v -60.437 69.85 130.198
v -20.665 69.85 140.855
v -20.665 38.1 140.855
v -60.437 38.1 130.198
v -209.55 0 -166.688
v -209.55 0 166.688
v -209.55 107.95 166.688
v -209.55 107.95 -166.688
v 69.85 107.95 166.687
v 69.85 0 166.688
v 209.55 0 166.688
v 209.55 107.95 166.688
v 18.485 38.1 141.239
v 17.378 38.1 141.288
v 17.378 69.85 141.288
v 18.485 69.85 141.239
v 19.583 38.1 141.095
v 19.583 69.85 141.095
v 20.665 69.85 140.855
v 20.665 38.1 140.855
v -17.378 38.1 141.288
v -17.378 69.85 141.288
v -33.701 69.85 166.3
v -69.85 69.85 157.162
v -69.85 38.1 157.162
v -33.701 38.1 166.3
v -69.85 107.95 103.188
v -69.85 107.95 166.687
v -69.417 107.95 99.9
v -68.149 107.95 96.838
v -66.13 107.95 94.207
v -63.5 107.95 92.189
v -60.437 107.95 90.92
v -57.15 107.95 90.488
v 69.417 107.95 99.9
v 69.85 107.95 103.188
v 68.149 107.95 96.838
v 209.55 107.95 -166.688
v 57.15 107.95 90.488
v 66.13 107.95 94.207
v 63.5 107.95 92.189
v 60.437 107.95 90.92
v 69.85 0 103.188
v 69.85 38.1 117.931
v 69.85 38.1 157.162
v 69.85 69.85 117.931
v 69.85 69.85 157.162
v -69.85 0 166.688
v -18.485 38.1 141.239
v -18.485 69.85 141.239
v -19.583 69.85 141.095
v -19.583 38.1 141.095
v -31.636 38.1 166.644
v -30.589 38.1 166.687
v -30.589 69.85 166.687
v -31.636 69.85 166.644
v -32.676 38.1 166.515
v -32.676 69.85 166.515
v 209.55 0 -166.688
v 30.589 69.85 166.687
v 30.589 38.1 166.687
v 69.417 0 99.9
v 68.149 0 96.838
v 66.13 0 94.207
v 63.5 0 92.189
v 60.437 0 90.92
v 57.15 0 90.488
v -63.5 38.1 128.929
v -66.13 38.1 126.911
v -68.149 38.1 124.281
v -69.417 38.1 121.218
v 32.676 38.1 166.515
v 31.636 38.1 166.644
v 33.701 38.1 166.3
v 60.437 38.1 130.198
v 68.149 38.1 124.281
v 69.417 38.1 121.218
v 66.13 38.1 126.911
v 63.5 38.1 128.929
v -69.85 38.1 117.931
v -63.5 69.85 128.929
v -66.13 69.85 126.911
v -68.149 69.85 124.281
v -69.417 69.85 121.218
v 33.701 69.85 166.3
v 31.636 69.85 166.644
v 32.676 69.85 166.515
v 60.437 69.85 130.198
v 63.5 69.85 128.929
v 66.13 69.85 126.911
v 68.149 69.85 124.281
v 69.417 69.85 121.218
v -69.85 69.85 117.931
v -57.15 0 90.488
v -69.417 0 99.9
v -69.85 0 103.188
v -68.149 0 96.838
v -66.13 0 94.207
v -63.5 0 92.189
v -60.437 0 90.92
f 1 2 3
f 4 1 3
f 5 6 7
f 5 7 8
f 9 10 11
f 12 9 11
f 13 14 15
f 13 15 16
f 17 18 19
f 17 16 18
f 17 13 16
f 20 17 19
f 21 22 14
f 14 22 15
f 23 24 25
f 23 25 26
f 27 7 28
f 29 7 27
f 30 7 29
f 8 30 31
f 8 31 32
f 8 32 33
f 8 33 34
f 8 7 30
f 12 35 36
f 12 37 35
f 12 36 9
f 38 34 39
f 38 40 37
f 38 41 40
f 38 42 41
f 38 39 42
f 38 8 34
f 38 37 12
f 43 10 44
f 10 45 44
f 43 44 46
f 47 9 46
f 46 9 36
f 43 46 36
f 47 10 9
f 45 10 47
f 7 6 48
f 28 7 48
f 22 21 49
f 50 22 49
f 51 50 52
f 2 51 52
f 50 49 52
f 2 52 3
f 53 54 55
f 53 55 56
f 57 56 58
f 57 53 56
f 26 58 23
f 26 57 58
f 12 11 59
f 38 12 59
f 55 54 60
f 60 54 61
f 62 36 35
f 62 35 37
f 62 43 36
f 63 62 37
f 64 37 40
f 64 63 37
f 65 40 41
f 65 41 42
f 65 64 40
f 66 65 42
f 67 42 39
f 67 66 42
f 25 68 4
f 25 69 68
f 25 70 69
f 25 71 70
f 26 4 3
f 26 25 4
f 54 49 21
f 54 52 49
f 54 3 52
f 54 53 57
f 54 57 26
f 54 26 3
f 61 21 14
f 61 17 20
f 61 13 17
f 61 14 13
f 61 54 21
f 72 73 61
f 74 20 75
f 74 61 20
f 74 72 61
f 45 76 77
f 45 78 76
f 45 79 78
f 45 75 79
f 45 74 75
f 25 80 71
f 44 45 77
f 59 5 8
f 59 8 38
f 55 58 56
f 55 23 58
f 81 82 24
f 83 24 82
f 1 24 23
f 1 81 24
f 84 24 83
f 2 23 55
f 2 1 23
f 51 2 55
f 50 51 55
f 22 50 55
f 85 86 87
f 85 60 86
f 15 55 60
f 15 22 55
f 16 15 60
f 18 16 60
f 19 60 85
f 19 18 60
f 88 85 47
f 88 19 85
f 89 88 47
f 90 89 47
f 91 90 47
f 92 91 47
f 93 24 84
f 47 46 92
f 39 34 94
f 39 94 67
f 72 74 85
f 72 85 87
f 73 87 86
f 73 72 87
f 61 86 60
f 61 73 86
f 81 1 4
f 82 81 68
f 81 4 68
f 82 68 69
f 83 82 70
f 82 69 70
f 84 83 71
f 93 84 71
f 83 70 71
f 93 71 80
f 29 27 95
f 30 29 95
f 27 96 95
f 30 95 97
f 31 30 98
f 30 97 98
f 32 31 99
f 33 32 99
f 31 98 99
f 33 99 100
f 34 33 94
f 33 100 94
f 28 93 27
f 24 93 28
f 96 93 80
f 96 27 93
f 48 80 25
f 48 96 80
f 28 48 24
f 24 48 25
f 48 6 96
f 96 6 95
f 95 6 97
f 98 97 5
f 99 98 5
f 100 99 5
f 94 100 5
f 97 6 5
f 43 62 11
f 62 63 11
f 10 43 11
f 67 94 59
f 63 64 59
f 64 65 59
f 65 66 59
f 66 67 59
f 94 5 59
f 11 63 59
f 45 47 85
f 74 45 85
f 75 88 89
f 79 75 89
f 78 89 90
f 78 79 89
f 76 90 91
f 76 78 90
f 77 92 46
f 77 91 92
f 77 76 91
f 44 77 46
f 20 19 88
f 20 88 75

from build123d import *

# Parameters (mm, degrees)
SKETCH1_W           = 419.1
SKETCH1_H           = 333.375
BOSS_EXTRUDE1_DEPTH = 107.95
SKETCH2_W           = 139.7
SKETCH2_H           = 50.8
CUT_EXTRUDE1_DEPTH  = 108.95
CHAMFER1_SIZE       = 50.8
CHAMFER1_SIZE2      = 13.611818976
FILLET1_R           = 12.7
SKETCH3_W           = 139.7
SKETCH3_H           = 56.403006085
CUT_EXTRUDE2_DEPTH  = 38.1
SKETCH4_W           = 139.7
SKETCH4_H           = 56.128435861
CUT_EXTRUDE3_DEPTH  = 38.1


with BuildPart() as part:
    # Sketch1 → Boss-Extrude1 (new body)
    with BuildSketch(Plane(origin=(0, 0, 0), x_dir=(1, 0, 0), z_dir=(0, 1, 0))):
        Rectangle(SKETCH1_W, SKETCH1_H)
    extrude(amount=BOSS_EXTRUDE1_DEPTH)

    # Sketch2 → Cut-Extrude1 (cut, through all)
    with BuildSketch(Plane(origin=(0, 107.95, 0), x_dir=(1, 0, 0), z_dir=(0, 1, 0))):
        with Locations((0, -115.8875)):
            Rectangle(SKETCH2_W, SKETCH2_H)
        Polygon((-69.85, -166.6875), (-69.85, -157.1625), (-32.169017961, -166.6875), align=None)
        Polygon((32.169017961, -166.6875), (69.85, -166.6875), (69.85, -157.1625), align=None)
    extrude(amount=-CUT_EXTRUDE1_DEPTH, mode=Mode.SUBTRACT)

    # Chamfer1
    chamfer1_edges = [part.edges().sort_by_distance(p)[0] for p in [
        (69.85, 53.975, 141.2875),
        (-69.85, 53.975, 141.2875),
    ]]
    chamfer1_side = [part.faces().sort_by_distance(p)[0] for p in [
        (0, 53.975, 141.2875),
    ]]
    chamfer(chamfer1_edges, length=CHAMFER1_SIZE, length2=CHAMFER1_SIZE2, reference=chamfer1_side[0])

    # Fillet1
    fillet1_edges = [part.edges().sort_by_distance(p)[0] for p in [
        (69.85, 53.975, 90.4875),
        (-69.85, 53.975, 90.4875),
        (-32.169017961, 53.975, 166.6875),
        (32.169017961, 53.975, 166.6875),
        (69.85, 53.975, 127.675681024),
        (-19.05, 53.975, 141.2875),
        (19.05, 53.975, 141.2875),
        (-69.85, 53.975, 127.675681024),
    ]]
    fillet(fillet1_edges, radius=FILLET1_R)

    # Sketch3 → Cut-Extrude2 (cut)
    with BuildSketch(Plane(origin=(0, 107.95, 0), x_dir=(1, 0, 0), z_dir=(0, 1, 0))):
        with Locations((0, -138.485996957)):
            Rectangle(SKETCH3_W, SKETCH3_H)
    extrude(amount=-CUT_EXTRUDE2_DEPTH, mode=Mode.SUBTRACT)

    # Sketch4 → Cut-Extrude3 (cut)
    with BuildSketch(Plane.XZ):
        with Locations((0, 138.623282069)):
            Rectangle(SKETCH4_W, SKETCH4_H)
    extrude(amount=-CUT_EXTRUDE3_DEPTH, mode=Mode.SUBTRACT)


solid = part.part
